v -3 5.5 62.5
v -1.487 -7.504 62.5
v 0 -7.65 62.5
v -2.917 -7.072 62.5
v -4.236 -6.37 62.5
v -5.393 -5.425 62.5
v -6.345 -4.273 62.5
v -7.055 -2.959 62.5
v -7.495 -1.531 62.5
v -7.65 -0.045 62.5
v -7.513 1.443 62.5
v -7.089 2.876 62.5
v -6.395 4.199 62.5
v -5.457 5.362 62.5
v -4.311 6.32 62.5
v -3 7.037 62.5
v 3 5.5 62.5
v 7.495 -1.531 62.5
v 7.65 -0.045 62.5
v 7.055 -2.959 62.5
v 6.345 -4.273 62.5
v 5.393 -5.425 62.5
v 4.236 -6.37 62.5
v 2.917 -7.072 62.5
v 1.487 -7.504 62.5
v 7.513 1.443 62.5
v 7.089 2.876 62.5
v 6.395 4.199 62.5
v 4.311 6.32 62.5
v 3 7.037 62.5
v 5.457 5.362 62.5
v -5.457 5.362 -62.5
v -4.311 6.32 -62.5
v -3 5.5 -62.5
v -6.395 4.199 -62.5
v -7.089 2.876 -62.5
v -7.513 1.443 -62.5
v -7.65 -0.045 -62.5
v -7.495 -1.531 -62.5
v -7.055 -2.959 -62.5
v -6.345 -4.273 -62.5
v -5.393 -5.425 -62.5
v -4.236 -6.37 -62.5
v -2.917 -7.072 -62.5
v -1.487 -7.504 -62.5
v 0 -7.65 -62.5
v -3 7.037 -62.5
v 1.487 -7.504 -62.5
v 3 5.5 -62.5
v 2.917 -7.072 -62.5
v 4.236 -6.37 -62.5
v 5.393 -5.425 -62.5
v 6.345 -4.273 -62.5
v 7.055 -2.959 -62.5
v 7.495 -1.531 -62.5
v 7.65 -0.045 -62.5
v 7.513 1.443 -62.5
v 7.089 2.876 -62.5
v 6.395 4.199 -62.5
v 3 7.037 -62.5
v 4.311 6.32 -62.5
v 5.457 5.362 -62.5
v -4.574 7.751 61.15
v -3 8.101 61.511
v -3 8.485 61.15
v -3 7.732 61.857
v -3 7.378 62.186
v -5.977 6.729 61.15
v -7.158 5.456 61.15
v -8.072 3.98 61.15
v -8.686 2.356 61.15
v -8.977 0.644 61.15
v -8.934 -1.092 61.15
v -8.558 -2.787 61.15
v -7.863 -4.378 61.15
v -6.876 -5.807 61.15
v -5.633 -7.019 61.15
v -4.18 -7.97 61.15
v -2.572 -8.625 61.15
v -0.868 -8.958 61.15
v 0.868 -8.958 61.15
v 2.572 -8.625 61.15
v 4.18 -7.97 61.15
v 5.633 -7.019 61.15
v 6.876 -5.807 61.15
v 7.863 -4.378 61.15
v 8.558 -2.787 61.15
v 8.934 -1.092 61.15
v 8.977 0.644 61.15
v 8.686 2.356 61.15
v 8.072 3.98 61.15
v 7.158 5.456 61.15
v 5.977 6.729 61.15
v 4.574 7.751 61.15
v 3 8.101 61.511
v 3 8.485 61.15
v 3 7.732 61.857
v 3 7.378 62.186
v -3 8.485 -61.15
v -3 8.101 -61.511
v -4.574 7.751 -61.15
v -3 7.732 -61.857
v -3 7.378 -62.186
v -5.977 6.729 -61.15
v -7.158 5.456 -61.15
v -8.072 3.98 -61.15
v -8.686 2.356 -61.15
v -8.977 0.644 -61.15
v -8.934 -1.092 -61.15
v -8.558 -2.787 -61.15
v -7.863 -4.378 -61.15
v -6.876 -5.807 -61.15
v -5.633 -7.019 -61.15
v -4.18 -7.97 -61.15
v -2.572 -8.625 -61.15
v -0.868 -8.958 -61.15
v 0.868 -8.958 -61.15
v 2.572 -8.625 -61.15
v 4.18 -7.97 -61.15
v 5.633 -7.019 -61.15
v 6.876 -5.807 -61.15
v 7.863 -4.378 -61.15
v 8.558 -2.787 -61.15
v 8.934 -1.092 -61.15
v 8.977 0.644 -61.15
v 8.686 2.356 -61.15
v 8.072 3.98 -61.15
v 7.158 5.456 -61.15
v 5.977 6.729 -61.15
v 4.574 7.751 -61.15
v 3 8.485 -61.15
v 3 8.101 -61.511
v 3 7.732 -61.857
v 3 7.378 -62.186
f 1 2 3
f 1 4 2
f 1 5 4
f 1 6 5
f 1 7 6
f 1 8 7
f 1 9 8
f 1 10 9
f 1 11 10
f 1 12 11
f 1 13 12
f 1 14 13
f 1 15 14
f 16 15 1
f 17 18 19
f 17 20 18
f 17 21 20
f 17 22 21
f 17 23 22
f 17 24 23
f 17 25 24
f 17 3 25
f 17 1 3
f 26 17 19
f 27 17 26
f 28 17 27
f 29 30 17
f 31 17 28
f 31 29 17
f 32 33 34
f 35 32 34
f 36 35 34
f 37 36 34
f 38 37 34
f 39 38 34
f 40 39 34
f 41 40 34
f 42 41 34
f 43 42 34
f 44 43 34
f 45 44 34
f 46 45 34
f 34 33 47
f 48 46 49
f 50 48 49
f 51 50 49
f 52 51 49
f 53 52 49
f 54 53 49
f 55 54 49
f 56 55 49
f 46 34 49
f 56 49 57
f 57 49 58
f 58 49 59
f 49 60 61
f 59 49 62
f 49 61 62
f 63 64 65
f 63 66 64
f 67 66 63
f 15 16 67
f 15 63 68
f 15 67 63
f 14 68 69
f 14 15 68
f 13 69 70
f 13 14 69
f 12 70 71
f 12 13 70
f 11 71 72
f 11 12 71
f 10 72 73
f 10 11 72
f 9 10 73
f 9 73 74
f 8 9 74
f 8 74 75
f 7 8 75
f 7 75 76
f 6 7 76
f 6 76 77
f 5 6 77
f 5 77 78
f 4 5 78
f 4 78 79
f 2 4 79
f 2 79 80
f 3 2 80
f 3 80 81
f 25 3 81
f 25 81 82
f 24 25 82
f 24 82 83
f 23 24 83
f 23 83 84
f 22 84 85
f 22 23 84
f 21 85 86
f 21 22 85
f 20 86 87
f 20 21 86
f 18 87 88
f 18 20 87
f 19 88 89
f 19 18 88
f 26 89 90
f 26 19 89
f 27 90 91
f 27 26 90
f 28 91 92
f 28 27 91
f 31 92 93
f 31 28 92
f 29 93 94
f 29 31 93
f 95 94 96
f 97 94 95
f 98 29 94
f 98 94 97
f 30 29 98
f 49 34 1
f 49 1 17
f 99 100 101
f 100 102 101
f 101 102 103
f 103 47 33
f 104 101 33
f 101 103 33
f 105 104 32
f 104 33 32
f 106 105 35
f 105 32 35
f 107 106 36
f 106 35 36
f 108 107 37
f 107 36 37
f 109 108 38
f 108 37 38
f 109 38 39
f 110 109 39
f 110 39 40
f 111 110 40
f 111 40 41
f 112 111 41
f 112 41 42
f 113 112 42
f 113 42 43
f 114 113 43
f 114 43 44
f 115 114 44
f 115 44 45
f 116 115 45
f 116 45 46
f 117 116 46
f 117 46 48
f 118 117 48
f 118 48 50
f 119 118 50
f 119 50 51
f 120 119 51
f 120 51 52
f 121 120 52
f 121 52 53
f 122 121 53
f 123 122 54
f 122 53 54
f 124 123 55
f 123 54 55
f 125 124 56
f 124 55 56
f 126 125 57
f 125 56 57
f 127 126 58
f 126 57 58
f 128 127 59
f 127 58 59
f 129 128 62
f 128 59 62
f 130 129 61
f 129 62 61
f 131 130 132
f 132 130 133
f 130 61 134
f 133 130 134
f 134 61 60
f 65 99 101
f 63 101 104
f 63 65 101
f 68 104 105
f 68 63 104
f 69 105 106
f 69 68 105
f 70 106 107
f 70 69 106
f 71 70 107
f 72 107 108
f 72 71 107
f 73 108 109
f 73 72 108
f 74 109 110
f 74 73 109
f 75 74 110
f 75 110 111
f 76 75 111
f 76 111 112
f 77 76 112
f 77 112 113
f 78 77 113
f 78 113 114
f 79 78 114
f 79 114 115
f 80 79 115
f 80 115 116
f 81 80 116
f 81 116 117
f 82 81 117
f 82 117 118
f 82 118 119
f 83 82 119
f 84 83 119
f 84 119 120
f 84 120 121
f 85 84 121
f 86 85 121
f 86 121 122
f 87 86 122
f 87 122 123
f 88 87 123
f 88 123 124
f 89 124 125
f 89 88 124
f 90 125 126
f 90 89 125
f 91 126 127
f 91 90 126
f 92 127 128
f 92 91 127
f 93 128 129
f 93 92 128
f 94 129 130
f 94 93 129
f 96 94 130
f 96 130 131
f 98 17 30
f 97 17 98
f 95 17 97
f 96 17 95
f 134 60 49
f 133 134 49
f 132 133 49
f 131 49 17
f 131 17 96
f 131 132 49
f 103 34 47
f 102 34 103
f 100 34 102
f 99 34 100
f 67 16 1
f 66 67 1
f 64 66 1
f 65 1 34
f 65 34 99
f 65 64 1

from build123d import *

# Parameters (mm, degrees)
SKETCH1_R           = 9
EXTRUDE1_DEPTH      = 62.5
CHAMFER1_SIZE       = 1.35
SKETCH3_W           = 6
SKETCH3_H           = 3.5
EXTRUDE2_DEPTH      = 63.5
EXTRUDE2_DEPTH_BACK = 63.5


with BuildPart() as part:
    # Sketch1 → Extrude1 (new body, symmetric)
    with BuildSketch(Plane.XY):
        Circle(SKETCH1_R)
    extrude(amount=EXTRUDE1_DEPTH, both=True)

    # Chamfer1
    chamfer1_edges = [part.edges().sort_by_distance(p)[0] for p in [
        (-9, 0, -62.5),
        (-9, 0, 62.5),
    ]]
    chamfer(chamfer1_edges, length=CHAMFER1_SIZE)

    # Sketch3 → Extrude2 (cut, two sides)
    with BuildSketch(Plane.XY) as extrude2_sk:
        with Locations((0, 7.25)):
            Rectangle(SKETCH3_W, SKETCH3_H)
    extrude(amount=EXTRUDE2_DEPTH, mode=Mode.SUBTRACT)
    extrude(extrude2_sk.sketch, amount=-EXTRUDE2_DEPTH_BACK, mode=Mode.SUBTRACT)


solid = part.part
